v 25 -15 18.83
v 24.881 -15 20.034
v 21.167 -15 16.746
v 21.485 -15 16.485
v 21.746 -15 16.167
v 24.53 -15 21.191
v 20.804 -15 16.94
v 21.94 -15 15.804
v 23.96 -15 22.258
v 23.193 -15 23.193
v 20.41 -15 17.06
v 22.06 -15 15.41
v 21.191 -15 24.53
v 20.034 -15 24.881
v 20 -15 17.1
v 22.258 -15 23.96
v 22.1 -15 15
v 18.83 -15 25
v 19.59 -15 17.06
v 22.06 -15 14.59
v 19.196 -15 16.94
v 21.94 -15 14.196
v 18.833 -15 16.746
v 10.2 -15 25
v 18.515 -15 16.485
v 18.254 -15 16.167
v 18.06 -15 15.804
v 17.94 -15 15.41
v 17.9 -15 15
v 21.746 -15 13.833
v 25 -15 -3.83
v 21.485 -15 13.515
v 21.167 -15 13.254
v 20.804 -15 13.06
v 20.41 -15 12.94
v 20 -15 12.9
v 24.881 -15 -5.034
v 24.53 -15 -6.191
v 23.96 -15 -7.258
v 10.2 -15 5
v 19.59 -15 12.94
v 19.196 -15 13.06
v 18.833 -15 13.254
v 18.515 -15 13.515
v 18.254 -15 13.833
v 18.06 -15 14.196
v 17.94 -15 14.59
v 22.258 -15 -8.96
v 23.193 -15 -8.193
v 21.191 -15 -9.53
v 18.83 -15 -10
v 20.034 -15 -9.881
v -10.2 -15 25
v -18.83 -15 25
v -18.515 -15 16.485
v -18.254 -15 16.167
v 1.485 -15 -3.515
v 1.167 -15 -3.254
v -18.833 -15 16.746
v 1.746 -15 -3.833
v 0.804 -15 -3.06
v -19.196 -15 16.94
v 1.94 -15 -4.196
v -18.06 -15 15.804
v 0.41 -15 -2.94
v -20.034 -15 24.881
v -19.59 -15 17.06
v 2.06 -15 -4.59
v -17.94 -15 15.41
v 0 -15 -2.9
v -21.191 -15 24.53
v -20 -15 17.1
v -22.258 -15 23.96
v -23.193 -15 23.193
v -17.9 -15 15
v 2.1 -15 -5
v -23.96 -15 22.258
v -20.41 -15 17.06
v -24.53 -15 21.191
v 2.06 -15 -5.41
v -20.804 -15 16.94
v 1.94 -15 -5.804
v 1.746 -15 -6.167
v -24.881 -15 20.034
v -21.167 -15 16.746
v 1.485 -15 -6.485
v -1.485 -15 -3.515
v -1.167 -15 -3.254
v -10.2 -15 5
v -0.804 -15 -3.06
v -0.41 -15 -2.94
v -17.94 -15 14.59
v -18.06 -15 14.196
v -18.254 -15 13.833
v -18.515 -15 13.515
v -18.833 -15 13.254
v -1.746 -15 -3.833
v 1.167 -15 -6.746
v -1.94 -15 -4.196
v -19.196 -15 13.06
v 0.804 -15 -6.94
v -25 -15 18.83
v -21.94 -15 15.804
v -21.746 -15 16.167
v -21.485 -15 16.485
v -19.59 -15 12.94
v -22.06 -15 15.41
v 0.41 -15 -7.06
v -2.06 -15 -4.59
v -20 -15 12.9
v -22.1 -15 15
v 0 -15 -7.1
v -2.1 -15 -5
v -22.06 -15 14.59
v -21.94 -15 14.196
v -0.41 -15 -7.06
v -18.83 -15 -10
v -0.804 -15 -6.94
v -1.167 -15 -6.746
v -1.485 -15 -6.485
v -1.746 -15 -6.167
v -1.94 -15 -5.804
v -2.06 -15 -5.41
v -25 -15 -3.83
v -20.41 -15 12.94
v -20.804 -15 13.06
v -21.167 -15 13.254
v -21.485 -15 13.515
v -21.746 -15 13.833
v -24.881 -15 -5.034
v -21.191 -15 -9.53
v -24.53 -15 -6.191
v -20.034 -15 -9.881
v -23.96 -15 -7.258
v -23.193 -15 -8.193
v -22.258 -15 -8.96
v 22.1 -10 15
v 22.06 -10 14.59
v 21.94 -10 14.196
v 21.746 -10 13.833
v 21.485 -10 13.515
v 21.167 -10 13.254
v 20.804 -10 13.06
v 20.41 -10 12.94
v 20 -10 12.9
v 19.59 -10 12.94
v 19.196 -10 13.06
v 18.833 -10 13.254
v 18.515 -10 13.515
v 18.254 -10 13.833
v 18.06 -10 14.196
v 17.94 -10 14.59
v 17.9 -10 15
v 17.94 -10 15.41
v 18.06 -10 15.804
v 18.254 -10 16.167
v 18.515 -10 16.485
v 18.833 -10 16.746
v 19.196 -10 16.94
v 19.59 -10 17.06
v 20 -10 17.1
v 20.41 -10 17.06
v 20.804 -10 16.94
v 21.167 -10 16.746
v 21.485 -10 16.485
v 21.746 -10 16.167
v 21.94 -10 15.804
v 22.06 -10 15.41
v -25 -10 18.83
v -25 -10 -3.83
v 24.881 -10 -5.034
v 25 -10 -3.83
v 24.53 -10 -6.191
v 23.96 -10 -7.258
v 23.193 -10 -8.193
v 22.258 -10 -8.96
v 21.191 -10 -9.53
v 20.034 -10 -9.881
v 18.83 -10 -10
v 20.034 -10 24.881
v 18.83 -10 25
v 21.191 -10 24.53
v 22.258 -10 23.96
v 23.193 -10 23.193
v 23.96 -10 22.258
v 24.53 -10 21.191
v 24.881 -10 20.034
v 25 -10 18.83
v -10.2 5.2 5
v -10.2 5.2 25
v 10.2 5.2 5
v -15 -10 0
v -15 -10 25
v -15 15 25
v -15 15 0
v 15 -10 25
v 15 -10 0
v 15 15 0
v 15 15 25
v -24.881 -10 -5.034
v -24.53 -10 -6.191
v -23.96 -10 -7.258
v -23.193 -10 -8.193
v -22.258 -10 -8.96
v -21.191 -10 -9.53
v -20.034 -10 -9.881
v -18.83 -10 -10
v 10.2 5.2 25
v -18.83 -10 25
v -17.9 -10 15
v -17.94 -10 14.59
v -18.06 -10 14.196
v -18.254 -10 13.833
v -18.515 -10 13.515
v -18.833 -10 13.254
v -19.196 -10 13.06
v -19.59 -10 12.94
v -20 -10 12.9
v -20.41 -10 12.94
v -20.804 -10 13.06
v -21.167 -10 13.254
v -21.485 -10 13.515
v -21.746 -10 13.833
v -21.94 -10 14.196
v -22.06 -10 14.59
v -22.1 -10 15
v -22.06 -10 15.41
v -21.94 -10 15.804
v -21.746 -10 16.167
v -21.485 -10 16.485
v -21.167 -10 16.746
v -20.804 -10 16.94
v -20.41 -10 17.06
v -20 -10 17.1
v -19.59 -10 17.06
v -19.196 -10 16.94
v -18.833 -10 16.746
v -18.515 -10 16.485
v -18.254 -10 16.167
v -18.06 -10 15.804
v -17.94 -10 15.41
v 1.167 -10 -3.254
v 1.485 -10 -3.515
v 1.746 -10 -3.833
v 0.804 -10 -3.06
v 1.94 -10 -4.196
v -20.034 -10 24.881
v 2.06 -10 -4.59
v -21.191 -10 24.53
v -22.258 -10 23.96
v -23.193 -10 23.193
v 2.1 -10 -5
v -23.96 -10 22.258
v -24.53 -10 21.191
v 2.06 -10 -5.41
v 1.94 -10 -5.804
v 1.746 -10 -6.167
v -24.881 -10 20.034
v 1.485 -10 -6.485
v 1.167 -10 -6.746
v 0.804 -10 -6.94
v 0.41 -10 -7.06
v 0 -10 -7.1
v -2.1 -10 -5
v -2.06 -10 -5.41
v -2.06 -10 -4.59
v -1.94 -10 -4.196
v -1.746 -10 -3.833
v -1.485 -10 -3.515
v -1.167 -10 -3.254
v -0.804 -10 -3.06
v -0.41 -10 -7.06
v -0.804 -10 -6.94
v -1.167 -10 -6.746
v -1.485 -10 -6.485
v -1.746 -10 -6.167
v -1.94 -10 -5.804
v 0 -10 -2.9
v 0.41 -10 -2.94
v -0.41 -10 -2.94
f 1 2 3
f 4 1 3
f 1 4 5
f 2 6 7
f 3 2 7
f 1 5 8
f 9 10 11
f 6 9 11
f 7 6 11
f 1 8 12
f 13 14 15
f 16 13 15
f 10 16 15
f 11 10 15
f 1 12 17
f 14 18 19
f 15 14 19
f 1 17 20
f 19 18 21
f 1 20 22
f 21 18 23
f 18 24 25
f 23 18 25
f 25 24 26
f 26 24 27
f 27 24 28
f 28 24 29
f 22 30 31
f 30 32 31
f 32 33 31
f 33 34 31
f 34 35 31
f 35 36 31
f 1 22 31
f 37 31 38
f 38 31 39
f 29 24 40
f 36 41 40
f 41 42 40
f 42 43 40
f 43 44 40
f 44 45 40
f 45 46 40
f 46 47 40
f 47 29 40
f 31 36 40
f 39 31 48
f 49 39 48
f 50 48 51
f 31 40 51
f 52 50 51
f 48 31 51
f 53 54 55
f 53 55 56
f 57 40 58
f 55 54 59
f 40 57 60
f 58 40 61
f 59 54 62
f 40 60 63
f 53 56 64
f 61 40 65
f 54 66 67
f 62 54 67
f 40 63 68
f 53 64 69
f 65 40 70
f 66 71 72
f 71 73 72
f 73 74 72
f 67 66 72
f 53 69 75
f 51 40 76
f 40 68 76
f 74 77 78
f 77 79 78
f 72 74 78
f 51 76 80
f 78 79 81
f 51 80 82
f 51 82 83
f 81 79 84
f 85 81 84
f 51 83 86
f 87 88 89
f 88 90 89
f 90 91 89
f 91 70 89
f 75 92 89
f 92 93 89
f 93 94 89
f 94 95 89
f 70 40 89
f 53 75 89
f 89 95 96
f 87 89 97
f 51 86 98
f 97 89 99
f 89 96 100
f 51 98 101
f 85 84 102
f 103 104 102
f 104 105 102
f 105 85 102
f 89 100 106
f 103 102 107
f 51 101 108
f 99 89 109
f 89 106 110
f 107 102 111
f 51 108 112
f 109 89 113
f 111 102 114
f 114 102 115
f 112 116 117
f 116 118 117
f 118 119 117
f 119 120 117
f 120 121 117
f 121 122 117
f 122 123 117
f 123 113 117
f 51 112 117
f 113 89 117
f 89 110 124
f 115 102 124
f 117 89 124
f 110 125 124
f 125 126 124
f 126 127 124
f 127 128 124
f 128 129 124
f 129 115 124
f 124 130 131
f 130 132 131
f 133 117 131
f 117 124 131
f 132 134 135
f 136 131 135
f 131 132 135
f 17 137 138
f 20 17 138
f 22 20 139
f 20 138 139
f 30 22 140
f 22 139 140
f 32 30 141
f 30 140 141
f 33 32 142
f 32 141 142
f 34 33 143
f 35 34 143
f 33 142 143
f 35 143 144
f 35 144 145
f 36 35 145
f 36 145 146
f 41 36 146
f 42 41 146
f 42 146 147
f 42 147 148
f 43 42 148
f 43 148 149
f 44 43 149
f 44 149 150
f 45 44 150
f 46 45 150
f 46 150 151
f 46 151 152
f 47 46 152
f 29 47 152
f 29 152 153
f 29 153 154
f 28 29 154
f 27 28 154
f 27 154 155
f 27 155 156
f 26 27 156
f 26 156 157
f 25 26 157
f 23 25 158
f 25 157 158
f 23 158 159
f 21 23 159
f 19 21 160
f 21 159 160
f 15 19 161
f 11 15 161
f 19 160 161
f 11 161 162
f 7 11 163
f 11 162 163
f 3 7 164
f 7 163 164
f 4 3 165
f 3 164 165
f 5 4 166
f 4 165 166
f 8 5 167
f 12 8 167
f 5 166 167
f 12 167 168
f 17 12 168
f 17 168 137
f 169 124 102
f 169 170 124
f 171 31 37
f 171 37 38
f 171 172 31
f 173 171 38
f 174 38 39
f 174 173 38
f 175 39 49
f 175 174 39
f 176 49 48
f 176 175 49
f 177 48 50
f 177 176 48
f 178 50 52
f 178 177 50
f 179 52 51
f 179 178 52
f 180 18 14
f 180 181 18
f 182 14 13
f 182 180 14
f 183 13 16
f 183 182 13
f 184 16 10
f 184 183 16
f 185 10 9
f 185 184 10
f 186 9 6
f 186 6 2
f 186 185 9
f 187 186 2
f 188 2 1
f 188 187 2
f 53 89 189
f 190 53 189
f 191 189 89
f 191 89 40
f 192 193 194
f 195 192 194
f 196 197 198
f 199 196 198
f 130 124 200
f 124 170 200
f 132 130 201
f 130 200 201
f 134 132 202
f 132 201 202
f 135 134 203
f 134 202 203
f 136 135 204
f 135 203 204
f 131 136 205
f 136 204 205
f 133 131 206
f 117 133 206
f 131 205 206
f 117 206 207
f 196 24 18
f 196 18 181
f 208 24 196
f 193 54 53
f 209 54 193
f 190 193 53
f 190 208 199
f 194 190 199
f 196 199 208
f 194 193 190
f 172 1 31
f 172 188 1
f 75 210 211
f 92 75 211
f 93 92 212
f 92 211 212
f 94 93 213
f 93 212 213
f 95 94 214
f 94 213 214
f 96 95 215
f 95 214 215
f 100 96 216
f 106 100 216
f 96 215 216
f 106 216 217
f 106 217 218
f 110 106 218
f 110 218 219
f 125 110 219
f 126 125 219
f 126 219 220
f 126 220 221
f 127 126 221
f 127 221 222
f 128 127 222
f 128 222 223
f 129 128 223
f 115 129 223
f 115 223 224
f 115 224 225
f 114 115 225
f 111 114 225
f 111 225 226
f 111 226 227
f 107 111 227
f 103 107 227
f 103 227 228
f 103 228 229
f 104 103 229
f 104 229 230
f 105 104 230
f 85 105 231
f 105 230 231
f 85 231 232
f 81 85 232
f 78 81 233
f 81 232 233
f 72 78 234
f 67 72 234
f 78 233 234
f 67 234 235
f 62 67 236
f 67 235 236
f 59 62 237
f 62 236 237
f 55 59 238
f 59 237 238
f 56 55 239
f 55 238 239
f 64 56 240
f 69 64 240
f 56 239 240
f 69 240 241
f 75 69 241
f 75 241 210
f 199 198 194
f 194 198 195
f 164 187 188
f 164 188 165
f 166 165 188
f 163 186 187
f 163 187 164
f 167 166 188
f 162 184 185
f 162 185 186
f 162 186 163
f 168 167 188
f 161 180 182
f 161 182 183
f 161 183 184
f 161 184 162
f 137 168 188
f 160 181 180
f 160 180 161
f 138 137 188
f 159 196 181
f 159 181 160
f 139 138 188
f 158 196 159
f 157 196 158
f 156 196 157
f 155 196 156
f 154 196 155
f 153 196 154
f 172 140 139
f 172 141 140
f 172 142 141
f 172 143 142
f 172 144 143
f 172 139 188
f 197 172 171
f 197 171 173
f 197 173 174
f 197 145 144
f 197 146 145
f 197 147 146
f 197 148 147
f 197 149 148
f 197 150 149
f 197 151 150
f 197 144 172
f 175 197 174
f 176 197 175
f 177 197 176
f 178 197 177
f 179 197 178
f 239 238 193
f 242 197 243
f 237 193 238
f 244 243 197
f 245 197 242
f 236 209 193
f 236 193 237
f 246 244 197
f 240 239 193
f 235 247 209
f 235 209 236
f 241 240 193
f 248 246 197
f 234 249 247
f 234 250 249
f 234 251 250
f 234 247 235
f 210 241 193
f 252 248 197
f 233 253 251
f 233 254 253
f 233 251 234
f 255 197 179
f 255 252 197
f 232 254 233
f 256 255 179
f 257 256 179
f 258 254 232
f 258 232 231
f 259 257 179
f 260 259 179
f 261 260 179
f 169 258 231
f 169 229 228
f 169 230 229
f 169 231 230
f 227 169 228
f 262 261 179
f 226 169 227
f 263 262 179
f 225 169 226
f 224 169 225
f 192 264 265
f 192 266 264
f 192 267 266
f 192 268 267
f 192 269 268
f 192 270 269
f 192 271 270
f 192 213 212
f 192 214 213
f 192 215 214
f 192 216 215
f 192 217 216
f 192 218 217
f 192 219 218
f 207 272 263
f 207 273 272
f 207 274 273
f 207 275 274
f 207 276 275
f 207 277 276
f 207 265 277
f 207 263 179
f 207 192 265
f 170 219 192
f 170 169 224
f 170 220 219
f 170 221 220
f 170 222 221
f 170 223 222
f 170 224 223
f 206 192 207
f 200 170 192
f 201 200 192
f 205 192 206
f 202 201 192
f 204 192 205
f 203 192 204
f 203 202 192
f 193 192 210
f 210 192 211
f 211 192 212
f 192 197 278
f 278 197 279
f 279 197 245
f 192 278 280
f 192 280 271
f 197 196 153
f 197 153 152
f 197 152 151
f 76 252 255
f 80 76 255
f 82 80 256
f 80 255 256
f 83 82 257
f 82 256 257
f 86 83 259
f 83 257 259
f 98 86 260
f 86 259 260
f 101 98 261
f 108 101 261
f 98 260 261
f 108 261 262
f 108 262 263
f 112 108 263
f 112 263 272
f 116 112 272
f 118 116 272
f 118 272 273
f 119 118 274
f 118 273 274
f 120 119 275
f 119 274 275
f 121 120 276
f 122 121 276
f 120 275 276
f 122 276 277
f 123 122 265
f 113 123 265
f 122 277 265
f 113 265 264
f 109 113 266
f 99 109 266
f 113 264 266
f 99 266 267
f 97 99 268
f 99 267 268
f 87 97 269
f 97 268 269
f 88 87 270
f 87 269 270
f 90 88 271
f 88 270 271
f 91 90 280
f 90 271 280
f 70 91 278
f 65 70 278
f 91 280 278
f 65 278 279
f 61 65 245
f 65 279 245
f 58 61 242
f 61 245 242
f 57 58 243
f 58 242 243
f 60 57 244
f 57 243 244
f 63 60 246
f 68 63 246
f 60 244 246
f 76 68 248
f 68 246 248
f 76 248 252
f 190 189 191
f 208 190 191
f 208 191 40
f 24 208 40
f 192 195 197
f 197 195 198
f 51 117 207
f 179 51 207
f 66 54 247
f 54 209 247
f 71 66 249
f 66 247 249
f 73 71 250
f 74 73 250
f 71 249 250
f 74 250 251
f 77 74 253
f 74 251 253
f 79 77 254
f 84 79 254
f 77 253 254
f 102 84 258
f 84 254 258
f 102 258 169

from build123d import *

# Parameters (mm, degrees)
SKETCH_1_W          = 30
SKETCH_1_H          = 30
EXTRUDE_1_DEPTH     = 5
SKETCH_2_W          = 30
SKETCH_2_H          = 5
EXTRUDE_2_DEPTH     = 10
SKETCH_3_R          = 2.1
CUT_EXTRUDE_1_DEPTH = 5
EXTRUDE_3_DEPTH     = 20
SKETCH_5_W          = 35
SKETCH_5_H          = 5
EXTRUDE_4_DEPTH     = 10
SKETCH_6_W          = 35
SKETCH_6_H          = 5
EXTRUDE_5_DEPTH     = 10
SKETCH_7_R          = 2.1
CUT_EXTRUDE_2_DEPTH = 10
FILLET_1_R          = 6.17
FILLET_2_R          = 6.17
FILLET_3_R          = 6.17
FILLET_4_R          = 6.17


with BuildPart() as part:
    # 스케치1 → 보스-돌출1 (new body)
    with BuildSketch(Plane.XY):
        Rectangle(SKETCH_1_W, SKETCH_1_H)
    extrude(amount=EXTRUDE_1_DEPTH)

    # 스케치2 → 보스-돌출2 (add)
    with BuildSketch(Plane(origin=(0, 0, 0), x_dir=(-1, 0, 0), z_dir=(0, 0, -1))):
        with Locations((0, -12.5)):
            Rectangle(SKETCH_2_W, SKETCH_2_H)
    extrude(amount=EXTRUDE_2_DEPTH)

    # 스케치3 → 컷-돌출1 (cut)
    with BuildSketch(Plane(origin=(0, -10, 0), x_dir=(1, 0, 0), z_dir=(0, 1, 0))):
        with Locations((0, 5)):
            Circle(SKETCH_3_R)
    extrude(amount=-CUT_EXTRUDE_1_DEPTH, mode=Mode.SUBTRACT)

    # 스케치4 → 보스-돌출3 (add)
    with BuildSketch(Plane.XY.offset(5)):
        Polygon((10.2, -15), (15, -15), (15, 15), (-15, 15), (-15, -15), (-10.2, -15), (-10.2, 5.2), (10.2, 5.2), align=None)
    extrude(amount=EXTRUDE_3_DEPTH)

    # 스케치5 → 보스-돌출4 (add)
    with BuildSketch(Plane.ZY.offset(15)):
        with Locations((7.5, -12.5)):
            Rectangle(SKETCH_5_W, SKETCH_5_H)
    extrude(amount=EXTRUDE_4_DEPTH)

    # 스케치6 → 보스-돌출5 (add)
    with BuildSketch(Plane(origin=(15, 0, 0), x_dir=(0, 0, -1), z_dir=(1, 0, 0))):
        with Locations((-7.5, -12.5)):
            Rectangle(SKETCH_6_W, SKETCH_6_H)
    extrude(amount=EXTRUDE_5_DEPTH)

    # 스케치7 → 컷-돌출2 (cut)
    with BuildSketch(Plane(origin=(0, -10, 0), x_dir=(1, 0, 0), z_dir=(0, 1, 0))):
        with Locations((-20, -15)):
            Circle(SKETCH_7_R)
        with Locations((20, -15)):
            Circle(SKETCH_7_R)
    extrude(amount=-CUT_EXTRUDE_2_DEPTH, mode=Mode.SUBTRACT)

    # 필렛1
    fillet_1_edges = [part.edges().sort_by_distance(p)[0] for p in [
        (25, -12.5, 25),
    ]]
    fillet(fillet_1_edges, radius=FILLET_1_R)

    # 필렛2
    fillet_2_edges = [part.edges().sort_by_distance(p)[0] for p in [
        (25, -12.5, -10),
    ]]
    fillet(fillet_2_edges, radius=FILLET_2_R)

    # 필렛3
    fillet_3_edges = [part.edges().sort_by_distance(p)[0] for p in [
        (-25, -12.5, 25),
    ]]
    fillet(fillet_3_edges, radius=FILLET_3_R)

    # 필렛4
    fillet_4_edges = [part.edges().sort_by_distance(p)[0] for p in [
        (-25, -12.5, -10),
    ]]
    fillet(fillet_4_edges, radius=FILLET_4_R)


solid = part.part
